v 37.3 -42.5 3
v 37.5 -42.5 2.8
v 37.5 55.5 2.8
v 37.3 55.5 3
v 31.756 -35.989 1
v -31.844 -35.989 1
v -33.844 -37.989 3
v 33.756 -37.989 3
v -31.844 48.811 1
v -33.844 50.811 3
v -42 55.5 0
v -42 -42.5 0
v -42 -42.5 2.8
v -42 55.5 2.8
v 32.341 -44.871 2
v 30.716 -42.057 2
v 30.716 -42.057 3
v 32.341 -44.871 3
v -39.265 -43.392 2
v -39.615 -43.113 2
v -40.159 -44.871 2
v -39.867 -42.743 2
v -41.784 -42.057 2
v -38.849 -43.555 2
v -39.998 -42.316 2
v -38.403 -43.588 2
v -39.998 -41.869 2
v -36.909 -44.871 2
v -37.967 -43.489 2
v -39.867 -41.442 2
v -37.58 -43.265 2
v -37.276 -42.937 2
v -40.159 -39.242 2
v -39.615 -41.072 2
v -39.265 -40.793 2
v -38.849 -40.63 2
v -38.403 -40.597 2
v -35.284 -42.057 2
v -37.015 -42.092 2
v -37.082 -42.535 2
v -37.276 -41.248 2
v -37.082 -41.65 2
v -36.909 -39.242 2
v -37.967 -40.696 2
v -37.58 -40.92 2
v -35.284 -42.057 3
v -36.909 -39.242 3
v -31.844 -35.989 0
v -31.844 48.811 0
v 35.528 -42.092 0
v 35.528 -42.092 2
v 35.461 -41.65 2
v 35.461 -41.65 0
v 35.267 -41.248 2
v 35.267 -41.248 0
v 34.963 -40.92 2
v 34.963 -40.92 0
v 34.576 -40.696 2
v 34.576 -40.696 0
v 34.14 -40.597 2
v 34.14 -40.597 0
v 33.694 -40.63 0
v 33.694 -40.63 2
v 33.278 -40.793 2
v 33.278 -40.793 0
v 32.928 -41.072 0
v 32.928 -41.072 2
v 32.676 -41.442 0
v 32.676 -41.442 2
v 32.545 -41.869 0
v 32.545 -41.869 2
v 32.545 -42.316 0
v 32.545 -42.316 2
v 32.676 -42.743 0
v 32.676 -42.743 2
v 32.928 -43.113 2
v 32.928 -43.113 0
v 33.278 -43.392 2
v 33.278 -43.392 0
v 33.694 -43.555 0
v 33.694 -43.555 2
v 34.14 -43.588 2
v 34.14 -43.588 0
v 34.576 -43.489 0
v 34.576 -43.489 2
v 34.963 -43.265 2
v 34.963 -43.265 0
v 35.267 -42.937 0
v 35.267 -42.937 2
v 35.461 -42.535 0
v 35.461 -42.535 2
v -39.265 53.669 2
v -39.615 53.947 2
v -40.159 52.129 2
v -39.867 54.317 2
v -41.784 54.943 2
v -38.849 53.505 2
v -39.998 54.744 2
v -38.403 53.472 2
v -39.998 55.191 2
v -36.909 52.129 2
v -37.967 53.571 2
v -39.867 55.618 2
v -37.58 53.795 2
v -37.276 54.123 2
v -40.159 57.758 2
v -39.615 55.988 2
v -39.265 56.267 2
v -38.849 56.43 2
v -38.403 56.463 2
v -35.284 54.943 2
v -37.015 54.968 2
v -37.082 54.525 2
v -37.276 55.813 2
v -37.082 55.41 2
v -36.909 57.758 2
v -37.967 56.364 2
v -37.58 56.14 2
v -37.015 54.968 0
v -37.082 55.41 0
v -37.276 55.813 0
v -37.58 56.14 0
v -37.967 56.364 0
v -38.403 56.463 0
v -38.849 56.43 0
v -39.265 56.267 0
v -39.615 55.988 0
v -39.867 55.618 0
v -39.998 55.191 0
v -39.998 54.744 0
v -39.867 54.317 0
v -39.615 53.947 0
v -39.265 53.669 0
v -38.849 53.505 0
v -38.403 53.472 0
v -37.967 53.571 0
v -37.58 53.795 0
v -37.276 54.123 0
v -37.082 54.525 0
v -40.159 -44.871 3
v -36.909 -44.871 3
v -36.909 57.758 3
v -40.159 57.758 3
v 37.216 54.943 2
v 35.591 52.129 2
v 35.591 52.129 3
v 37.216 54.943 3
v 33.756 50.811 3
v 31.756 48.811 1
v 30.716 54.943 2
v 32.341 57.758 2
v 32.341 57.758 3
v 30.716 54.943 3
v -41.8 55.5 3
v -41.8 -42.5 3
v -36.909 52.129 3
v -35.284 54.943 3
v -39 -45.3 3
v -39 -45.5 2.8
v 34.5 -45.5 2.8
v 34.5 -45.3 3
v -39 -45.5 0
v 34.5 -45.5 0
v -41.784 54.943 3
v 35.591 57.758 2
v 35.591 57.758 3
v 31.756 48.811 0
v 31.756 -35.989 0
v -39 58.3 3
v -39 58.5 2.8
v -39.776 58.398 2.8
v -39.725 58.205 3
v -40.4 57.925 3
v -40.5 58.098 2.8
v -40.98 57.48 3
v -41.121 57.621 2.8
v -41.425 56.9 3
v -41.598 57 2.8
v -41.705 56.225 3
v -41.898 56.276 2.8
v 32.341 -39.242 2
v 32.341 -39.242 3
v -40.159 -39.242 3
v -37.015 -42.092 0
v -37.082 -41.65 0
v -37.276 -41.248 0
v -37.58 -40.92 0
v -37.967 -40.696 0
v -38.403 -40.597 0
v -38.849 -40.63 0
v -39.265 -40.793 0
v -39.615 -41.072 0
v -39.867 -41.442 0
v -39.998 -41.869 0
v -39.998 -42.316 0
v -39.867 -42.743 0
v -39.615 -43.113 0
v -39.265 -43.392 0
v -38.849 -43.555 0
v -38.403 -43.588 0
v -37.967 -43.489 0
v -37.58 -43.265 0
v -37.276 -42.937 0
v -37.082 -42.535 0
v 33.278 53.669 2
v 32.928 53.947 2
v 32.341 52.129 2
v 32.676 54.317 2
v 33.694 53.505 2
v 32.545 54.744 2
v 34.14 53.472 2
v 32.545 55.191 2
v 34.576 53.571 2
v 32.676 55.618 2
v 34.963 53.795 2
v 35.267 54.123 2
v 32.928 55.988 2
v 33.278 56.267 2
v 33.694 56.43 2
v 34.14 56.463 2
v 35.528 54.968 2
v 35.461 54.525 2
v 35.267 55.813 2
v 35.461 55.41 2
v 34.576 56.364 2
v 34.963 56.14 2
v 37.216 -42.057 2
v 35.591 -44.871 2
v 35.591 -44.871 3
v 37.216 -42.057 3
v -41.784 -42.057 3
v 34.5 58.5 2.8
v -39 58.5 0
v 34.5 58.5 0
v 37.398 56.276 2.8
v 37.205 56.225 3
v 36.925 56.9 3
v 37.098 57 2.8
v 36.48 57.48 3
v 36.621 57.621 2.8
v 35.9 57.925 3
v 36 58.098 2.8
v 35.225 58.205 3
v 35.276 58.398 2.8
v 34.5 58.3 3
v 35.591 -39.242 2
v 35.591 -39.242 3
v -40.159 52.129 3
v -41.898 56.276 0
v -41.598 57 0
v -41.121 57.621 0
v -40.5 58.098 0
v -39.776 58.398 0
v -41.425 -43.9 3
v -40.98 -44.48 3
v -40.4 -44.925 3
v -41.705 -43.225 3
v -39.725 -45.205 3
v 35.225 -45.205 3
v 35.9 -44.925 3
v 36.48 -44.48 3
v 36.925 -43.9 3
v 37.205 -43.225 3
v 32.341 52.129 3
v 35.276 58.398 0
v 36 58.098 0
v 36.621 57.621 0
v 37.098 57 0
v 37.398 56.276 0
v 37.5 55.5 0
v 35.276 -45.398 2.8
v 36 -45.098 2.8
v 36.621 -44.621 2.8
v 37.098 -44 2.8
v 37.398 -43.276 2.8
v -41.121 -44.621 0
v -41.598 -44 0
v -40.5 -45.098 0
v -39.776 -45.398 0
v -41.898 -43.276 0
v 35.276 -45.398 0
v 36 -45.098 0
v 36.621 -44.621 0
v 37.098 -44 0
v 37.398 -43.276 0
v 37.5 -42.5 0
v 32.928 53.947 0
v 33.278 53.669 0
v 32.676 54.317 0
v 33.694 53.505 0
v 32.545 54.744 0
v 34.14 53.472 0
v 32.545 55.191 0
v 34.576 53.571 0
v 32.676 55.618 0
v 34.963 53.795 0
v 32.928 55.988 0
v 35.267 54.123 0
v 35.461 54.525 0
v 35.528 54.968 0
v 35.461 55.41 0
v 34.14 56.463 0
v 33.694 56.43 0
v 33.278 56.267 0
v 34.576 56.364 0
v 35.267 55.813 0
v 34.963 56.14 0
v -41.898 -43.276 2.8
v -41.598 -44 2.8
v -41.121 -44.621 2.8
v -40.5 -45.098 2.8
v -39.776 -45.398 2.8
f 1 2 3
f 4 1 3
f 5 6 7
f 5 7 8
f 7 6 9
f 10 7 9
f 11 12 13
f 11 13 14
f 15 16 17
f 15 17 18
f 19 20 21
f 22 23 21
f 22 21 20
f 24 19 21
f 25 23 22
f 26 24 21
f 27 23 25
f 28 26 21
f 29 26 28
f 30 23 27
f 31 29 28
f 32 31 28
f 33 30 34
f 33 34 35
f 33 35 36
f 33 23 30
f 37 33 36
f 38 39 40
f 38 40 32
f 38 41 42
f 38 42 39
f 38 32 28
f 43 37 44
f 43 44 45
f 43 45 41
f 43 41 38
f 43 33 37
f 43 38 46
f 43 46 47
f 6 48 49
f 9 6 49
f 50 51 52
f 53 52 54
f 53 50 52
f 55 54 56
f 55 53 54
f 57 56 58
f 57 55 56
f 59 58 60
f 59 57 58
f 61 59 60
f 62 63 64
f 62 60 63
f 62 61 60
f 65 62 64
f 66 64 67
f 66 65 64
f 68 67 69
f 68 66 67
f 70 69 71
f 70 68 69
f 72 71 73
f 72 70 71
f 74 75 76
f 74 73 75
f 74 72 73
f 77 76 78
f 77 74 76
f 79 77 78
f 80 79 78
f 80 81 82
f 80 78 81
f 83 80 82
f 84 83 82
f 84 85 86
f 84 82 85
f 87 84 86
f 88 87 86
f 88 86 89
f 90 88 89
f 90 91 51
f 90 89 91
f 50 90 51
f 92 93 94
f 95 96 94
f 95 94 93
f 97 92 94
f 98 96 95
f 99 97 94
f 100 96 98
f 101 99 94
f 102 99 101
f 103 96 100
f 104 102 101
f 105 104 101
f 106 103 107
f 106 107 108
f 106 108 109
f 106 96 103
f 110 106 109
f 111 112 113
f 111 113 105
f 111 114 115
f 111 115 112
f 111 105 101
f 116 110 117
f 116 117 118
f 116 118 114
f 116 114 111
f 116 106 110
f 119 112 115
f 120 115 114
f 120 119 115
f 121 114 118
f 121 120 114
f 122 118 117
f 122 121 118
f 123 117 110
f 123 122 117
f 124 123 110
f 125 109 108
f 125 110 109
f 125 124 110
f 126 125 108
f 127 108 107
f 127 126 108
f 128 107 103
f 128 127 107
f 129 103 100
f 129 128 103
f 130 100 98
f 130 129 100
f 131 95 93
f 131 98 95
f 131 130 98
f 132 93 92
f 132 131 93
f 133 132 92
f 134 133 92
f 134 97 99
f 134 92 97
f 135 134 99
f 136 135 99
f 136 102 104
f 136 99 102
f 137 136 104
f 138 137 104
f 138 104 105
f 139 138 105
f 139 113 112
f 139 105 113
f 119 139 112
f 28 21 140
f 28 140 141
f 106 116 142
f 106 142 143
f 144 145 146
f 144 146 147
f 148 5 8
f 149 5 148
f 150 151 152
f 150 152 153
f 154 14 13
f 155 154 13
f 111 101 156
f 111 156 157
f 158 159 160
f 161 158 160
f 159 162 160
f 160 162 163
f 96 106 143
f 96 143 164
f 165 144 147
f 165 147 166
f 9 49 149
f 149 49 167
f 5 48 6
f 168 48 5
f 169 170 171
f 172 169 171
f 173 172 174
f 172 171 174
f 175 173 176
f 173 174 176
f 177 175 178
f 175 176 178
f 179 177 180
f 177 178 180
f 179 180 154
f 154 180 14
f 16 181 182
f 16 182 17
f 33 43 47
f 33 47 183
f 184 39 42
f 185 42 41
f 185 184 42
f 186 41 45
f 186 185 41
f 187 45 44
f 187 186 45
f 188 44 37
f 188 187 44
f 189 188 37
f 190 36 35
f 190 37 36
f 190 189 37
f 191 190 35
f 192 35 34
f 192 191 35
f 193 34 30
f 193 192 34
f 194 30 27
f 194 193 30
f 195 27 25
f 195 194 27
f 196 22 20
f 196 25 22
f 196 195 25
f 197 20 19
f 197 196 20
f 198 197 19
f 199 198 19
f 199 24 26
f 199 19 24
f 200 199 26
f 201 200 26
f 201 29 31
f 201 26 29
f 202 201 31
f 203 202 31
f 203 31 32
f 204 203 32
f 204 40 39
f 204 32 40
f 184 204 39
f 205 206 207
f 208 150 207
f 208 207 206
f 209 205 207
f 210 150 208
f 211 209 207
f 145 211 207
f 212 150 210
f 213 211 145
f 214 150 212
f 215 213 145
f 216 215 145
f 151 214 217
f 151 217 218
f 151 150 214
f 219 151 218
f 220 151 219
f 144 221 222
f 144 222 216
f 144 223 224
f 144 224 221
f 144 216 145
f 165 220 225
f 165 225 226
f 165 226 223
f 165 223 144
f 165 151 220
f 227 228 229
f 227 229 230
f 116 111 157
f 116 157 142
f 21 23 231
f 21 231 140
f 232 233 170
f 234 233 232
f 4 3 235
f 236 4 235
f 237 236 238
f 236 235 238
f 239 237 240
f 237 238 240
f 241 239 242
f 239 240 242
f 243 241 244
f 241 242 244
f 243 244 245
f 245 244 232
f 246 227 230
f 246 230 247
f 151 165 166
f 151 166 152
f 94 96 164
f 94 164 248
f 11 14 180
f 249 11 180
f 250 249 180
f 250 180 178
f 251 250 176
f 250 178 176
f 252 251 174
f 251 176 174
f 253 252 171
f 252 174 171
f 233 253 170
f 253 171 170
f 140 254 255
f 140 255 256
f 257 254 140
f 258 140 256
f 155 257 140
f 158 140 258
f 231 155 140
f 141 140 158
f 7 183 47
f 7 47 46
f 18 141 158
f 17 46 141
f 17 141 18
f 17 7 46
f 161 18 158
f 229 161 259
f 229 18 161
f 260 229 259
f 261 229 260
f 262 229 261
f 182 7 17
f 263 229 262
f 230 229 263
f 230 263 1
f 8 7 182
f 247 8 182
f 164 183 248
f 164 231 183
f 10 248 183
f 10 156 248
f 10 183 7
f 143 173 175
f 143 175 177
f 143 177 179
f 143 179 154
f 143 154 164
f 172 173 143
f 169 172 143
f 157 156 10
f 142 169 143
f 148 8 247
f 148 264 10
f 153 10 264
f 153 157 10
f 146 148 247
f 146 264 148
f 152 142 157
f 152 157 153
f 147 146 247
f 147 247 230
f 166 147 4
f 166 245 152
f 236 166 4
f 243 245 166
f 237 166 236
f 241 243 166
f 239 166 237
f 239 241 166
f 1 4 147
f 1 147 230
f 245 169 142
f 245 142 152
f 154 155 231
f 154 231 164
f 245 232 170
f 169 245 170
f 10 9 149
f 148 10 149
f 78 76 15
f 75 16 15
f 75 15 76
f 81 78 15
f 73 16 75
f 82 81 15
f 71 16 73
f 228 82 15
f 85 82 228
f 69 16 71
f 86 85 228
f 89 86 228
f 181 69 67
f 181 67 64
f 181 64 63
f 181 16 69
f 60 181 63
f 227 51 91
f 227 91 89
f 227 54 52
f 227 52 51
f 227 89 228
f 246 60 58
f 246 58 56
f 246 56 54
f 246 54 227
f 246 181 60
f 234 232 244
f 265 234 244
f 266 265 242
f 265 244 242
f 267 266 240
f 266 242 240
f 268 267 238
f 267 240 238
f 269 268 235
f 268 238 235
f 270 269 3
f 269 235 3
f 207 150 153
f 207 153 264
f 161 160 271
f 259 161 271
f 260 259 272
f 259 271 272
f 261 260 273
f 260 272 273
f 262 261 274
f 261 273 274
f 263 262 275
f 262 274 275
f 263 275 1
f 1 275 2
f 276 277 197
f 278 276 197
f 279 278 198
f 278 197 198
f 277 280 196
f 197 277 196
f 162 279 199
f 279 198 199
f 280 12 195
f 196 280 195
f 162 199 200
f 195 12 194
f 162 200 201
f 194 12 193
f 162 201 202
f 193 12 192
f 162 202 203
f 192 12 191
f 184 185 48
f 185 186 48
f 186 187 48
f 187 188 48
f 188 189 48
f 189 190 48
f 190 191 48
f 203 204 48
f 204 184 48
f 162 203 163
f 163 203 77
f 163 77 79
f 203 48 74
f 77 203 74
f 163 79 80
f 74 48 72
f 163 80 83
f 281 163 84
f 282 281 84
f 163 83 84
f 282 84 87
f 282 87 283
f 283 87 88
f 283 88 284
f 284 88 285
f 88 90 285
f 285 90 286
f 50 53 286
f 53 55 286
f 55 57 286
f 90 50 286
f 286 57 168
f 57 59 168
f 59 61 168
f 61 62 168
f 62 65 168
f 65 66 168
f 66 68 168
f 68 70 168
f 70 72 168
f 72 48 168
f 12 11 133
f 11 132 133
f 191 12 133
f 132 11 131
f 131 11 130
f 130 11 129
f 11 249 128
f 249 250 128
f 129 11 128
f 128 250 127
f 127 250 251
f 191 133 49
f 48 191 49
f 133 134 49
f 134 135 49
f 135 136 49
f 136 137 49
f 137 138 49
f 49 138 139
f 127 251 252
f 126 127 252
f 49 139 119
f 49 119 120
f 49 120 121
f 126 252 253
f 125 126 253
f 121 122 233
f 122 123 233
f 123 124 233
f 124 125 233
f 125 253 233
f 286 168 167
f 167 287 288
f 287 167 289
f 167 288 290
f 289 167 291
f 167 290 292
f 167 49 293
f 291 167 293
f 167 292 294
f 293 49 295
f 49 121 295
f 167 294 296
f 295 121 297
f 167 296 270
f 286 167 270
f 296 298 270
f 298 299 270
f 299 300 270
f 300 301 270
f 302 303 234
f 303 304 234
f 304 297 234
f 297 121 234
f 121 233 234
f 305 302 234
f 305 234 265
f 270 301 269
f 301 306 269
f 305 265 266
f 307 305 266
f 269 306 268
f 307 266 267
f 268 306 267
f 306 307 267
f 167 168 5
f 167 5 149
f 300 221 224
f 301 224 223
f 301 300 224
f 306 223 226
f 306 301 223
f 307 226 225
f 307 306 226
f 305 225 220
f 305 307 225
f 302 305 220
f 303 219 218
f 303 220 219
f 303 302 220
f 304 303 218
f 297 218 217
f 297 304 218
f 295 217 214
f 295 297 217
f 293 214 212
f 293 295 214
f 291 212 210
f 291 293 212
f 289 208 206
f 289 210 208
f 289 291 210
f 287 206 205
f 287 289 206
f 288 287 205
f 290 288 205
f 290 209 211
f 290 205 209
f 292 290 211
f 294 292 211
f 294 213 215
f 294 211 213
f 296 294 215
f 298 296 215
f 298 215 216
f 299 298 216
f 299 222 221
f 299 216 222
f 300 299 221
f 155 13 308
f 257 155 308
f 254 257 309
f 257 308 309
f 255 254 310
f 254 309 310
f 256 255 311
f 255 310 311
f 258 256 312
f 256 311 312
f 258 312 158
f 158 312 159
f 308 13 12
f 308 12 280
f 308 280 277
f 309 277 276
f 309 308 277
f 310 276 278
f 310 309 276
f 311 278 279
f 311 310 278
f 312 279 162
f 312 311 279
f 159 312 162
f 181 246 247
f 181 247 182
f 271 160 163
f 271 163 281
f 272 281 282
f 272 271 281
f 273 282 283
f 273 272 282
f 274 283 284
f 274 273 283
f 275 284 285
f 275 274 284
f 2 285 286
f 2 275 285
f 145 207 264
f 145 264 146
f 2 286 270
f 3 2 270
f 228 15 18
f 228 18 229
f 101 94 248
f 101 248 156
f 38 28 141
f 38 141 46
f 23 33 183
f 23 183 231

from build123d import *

# Parameters (mm, degrees)
SKETCH005_W          = 79.5
SKETCH005_H          = 104
SKETCH005_W_2        = 63.6
SKETCH005_H_2        = 84.8
PAD005_DEPTH         = 3
POCKET004_DEPTH      = 2
POCKET005_DEPTH      = 2
POCKET006_DEPTH      = 2
POCKET007_DEPTH      = 2
SKETCH009_R          = 1.5
POCKET008_DEPTH      = 0.001
POCKET008_DEPTH_BACK = 3.001
FILLET001_R          = 3
CHAMFER_SIZE         = 2
CHAMFER009_SIZE      = 0.2


with BuildPart() as part:
    # Sketch005 → Pad005 (new body)
    with BuildSketch(Plane.XY):
        with Locations((-2.25, 6.5)):
            Rectangle(SKETCH005_W, SKETCH005_H)
        with Locations((-0.043942, 6.41066)):
            Rectangle(SKETCH005_W_2, SKETCH005_H_2, mode=Mode.SUBTRACT)
    extrude(amount=PAD005_DEPTH)

    # Sketch003 → Pocket004 (cut)
    with BuildSketch(Plane.XY.offset(2)):
        Polygon((-35.284015, 54.943331), (-36.909015, 57.757914), (-40.159015, 57.757914), (-41.784015, 54.943331), (-40.159015, 52.128748), (-36.909015, 52.128748), align=None)
    extrude(amount=POCKET004_DEPTH, mode=Mode.SUBTRACT)

    # Sketch007 → Pocket005 (cut)
    with BuildSketch(Plane.XY.offset(2)):
        Polygon((30.715985, -42.056669), (32.340985, -44.871252), (35.590985, -44.871252), (37.215985, -42.056669), (35.590985, -39.242086), (32.340985, -39.242086), align=None)
    extrude(amount=POCKET005_DEPTH, mode=Mode.SUBTRACT)

    # Sketch008 → Pocket006 (cut)
    with BuildSketch(Plane.XY.offset(2)):
        Polygon((32.340985, 52.128748), (35.590985, 52.128748), (37.215985, 54.943331), (35.590985, 57.757914), (32.340985, 57.757914), (30.715985, 54.943331), align=None)
    extrude(amount=POCKET006_DEPTH, mode=Mode.SUBTRACT)

    # Sketch006 → Pocket007 (cut)
    with BuildSketch(Plane.XY.offset(2)):
        Polygon((-35.284015, -42.056669), (-36.909015, -39.242086), (-40.159015, -39.242086), (-41.784015, -42.056669), (-40.159015, -44.871252), (-36.909015, -44.871252), align=None)
    extrude(amount=POCKET007_DEPTH, mode=Mode.SUBTRACT)

    # Sketch009 → Pocket008 (cut, two sides)
    with BuildSketch(Plane.XY) as pocket008_sk:
        with Locations((-38.515098, -42.092489)):
            Circle(SKETCH009_R)
        with Locations((34.02781, -42.092489)):
            Circle(SKETCH009_R)
        with Locations((34.02781, 54.9676)):
            Circle(SKETCH009_R)
        with Locations((-38.515098, 54.9676)):
            Circle(SKETCH009_R)
    extrude(amount=-POCKET008_DEPTH, mode=Mode.SUBTRACT)
    extrude(pocket008_sk.sketch, amount=POCKET008_DEPTH_BACK, mode=Mode.SUBTRACT)

    # Fillet001
    fillet001_edges = [part.edges().sort_by_distance(p)[0] for p in [
        (-42, 58.5, 1.5),
        (-42, -45.5, 1.5),
        (37.5, -45.5, 1.5),
        (37.5, 58.5, 1.5),
    ]]
    fillet(fillet001_edges, radius=FILLET001_R)

    # Chamfer
    chamfer_edges = [part.edges().sort_by_distance(p)[0] for p in [
        (-0.043942, -35.98934, 3),
        (31.756058, 6.41066, 3),
        (-31.843942, 6.41066, 3),
        (-0.043942, 48.81066, 3),
    ]]
    chamfer(chamfer_edges, length=CHAMFER_SIZE)

    # Chamfer009
    chamfer009_edges = [part.edges().sort_by_distance(p)[0] for p in [
        (-2.25, -45.5, 3),
        (-41.12132, -44.62132, 3),
        (-42, 6.5, 3),
        (36.62132, -44.62132, 3),
        (37.5, 6.5, 3),
        (36.62132, 57.62132, 3),
        (-2.25, 58.5, 3),
        (-41.12132, 57.62132, 3),
    ]]
    chamfer(chamfer009_edges, length=CHAMFER009_SIZE)


solid = part.part
